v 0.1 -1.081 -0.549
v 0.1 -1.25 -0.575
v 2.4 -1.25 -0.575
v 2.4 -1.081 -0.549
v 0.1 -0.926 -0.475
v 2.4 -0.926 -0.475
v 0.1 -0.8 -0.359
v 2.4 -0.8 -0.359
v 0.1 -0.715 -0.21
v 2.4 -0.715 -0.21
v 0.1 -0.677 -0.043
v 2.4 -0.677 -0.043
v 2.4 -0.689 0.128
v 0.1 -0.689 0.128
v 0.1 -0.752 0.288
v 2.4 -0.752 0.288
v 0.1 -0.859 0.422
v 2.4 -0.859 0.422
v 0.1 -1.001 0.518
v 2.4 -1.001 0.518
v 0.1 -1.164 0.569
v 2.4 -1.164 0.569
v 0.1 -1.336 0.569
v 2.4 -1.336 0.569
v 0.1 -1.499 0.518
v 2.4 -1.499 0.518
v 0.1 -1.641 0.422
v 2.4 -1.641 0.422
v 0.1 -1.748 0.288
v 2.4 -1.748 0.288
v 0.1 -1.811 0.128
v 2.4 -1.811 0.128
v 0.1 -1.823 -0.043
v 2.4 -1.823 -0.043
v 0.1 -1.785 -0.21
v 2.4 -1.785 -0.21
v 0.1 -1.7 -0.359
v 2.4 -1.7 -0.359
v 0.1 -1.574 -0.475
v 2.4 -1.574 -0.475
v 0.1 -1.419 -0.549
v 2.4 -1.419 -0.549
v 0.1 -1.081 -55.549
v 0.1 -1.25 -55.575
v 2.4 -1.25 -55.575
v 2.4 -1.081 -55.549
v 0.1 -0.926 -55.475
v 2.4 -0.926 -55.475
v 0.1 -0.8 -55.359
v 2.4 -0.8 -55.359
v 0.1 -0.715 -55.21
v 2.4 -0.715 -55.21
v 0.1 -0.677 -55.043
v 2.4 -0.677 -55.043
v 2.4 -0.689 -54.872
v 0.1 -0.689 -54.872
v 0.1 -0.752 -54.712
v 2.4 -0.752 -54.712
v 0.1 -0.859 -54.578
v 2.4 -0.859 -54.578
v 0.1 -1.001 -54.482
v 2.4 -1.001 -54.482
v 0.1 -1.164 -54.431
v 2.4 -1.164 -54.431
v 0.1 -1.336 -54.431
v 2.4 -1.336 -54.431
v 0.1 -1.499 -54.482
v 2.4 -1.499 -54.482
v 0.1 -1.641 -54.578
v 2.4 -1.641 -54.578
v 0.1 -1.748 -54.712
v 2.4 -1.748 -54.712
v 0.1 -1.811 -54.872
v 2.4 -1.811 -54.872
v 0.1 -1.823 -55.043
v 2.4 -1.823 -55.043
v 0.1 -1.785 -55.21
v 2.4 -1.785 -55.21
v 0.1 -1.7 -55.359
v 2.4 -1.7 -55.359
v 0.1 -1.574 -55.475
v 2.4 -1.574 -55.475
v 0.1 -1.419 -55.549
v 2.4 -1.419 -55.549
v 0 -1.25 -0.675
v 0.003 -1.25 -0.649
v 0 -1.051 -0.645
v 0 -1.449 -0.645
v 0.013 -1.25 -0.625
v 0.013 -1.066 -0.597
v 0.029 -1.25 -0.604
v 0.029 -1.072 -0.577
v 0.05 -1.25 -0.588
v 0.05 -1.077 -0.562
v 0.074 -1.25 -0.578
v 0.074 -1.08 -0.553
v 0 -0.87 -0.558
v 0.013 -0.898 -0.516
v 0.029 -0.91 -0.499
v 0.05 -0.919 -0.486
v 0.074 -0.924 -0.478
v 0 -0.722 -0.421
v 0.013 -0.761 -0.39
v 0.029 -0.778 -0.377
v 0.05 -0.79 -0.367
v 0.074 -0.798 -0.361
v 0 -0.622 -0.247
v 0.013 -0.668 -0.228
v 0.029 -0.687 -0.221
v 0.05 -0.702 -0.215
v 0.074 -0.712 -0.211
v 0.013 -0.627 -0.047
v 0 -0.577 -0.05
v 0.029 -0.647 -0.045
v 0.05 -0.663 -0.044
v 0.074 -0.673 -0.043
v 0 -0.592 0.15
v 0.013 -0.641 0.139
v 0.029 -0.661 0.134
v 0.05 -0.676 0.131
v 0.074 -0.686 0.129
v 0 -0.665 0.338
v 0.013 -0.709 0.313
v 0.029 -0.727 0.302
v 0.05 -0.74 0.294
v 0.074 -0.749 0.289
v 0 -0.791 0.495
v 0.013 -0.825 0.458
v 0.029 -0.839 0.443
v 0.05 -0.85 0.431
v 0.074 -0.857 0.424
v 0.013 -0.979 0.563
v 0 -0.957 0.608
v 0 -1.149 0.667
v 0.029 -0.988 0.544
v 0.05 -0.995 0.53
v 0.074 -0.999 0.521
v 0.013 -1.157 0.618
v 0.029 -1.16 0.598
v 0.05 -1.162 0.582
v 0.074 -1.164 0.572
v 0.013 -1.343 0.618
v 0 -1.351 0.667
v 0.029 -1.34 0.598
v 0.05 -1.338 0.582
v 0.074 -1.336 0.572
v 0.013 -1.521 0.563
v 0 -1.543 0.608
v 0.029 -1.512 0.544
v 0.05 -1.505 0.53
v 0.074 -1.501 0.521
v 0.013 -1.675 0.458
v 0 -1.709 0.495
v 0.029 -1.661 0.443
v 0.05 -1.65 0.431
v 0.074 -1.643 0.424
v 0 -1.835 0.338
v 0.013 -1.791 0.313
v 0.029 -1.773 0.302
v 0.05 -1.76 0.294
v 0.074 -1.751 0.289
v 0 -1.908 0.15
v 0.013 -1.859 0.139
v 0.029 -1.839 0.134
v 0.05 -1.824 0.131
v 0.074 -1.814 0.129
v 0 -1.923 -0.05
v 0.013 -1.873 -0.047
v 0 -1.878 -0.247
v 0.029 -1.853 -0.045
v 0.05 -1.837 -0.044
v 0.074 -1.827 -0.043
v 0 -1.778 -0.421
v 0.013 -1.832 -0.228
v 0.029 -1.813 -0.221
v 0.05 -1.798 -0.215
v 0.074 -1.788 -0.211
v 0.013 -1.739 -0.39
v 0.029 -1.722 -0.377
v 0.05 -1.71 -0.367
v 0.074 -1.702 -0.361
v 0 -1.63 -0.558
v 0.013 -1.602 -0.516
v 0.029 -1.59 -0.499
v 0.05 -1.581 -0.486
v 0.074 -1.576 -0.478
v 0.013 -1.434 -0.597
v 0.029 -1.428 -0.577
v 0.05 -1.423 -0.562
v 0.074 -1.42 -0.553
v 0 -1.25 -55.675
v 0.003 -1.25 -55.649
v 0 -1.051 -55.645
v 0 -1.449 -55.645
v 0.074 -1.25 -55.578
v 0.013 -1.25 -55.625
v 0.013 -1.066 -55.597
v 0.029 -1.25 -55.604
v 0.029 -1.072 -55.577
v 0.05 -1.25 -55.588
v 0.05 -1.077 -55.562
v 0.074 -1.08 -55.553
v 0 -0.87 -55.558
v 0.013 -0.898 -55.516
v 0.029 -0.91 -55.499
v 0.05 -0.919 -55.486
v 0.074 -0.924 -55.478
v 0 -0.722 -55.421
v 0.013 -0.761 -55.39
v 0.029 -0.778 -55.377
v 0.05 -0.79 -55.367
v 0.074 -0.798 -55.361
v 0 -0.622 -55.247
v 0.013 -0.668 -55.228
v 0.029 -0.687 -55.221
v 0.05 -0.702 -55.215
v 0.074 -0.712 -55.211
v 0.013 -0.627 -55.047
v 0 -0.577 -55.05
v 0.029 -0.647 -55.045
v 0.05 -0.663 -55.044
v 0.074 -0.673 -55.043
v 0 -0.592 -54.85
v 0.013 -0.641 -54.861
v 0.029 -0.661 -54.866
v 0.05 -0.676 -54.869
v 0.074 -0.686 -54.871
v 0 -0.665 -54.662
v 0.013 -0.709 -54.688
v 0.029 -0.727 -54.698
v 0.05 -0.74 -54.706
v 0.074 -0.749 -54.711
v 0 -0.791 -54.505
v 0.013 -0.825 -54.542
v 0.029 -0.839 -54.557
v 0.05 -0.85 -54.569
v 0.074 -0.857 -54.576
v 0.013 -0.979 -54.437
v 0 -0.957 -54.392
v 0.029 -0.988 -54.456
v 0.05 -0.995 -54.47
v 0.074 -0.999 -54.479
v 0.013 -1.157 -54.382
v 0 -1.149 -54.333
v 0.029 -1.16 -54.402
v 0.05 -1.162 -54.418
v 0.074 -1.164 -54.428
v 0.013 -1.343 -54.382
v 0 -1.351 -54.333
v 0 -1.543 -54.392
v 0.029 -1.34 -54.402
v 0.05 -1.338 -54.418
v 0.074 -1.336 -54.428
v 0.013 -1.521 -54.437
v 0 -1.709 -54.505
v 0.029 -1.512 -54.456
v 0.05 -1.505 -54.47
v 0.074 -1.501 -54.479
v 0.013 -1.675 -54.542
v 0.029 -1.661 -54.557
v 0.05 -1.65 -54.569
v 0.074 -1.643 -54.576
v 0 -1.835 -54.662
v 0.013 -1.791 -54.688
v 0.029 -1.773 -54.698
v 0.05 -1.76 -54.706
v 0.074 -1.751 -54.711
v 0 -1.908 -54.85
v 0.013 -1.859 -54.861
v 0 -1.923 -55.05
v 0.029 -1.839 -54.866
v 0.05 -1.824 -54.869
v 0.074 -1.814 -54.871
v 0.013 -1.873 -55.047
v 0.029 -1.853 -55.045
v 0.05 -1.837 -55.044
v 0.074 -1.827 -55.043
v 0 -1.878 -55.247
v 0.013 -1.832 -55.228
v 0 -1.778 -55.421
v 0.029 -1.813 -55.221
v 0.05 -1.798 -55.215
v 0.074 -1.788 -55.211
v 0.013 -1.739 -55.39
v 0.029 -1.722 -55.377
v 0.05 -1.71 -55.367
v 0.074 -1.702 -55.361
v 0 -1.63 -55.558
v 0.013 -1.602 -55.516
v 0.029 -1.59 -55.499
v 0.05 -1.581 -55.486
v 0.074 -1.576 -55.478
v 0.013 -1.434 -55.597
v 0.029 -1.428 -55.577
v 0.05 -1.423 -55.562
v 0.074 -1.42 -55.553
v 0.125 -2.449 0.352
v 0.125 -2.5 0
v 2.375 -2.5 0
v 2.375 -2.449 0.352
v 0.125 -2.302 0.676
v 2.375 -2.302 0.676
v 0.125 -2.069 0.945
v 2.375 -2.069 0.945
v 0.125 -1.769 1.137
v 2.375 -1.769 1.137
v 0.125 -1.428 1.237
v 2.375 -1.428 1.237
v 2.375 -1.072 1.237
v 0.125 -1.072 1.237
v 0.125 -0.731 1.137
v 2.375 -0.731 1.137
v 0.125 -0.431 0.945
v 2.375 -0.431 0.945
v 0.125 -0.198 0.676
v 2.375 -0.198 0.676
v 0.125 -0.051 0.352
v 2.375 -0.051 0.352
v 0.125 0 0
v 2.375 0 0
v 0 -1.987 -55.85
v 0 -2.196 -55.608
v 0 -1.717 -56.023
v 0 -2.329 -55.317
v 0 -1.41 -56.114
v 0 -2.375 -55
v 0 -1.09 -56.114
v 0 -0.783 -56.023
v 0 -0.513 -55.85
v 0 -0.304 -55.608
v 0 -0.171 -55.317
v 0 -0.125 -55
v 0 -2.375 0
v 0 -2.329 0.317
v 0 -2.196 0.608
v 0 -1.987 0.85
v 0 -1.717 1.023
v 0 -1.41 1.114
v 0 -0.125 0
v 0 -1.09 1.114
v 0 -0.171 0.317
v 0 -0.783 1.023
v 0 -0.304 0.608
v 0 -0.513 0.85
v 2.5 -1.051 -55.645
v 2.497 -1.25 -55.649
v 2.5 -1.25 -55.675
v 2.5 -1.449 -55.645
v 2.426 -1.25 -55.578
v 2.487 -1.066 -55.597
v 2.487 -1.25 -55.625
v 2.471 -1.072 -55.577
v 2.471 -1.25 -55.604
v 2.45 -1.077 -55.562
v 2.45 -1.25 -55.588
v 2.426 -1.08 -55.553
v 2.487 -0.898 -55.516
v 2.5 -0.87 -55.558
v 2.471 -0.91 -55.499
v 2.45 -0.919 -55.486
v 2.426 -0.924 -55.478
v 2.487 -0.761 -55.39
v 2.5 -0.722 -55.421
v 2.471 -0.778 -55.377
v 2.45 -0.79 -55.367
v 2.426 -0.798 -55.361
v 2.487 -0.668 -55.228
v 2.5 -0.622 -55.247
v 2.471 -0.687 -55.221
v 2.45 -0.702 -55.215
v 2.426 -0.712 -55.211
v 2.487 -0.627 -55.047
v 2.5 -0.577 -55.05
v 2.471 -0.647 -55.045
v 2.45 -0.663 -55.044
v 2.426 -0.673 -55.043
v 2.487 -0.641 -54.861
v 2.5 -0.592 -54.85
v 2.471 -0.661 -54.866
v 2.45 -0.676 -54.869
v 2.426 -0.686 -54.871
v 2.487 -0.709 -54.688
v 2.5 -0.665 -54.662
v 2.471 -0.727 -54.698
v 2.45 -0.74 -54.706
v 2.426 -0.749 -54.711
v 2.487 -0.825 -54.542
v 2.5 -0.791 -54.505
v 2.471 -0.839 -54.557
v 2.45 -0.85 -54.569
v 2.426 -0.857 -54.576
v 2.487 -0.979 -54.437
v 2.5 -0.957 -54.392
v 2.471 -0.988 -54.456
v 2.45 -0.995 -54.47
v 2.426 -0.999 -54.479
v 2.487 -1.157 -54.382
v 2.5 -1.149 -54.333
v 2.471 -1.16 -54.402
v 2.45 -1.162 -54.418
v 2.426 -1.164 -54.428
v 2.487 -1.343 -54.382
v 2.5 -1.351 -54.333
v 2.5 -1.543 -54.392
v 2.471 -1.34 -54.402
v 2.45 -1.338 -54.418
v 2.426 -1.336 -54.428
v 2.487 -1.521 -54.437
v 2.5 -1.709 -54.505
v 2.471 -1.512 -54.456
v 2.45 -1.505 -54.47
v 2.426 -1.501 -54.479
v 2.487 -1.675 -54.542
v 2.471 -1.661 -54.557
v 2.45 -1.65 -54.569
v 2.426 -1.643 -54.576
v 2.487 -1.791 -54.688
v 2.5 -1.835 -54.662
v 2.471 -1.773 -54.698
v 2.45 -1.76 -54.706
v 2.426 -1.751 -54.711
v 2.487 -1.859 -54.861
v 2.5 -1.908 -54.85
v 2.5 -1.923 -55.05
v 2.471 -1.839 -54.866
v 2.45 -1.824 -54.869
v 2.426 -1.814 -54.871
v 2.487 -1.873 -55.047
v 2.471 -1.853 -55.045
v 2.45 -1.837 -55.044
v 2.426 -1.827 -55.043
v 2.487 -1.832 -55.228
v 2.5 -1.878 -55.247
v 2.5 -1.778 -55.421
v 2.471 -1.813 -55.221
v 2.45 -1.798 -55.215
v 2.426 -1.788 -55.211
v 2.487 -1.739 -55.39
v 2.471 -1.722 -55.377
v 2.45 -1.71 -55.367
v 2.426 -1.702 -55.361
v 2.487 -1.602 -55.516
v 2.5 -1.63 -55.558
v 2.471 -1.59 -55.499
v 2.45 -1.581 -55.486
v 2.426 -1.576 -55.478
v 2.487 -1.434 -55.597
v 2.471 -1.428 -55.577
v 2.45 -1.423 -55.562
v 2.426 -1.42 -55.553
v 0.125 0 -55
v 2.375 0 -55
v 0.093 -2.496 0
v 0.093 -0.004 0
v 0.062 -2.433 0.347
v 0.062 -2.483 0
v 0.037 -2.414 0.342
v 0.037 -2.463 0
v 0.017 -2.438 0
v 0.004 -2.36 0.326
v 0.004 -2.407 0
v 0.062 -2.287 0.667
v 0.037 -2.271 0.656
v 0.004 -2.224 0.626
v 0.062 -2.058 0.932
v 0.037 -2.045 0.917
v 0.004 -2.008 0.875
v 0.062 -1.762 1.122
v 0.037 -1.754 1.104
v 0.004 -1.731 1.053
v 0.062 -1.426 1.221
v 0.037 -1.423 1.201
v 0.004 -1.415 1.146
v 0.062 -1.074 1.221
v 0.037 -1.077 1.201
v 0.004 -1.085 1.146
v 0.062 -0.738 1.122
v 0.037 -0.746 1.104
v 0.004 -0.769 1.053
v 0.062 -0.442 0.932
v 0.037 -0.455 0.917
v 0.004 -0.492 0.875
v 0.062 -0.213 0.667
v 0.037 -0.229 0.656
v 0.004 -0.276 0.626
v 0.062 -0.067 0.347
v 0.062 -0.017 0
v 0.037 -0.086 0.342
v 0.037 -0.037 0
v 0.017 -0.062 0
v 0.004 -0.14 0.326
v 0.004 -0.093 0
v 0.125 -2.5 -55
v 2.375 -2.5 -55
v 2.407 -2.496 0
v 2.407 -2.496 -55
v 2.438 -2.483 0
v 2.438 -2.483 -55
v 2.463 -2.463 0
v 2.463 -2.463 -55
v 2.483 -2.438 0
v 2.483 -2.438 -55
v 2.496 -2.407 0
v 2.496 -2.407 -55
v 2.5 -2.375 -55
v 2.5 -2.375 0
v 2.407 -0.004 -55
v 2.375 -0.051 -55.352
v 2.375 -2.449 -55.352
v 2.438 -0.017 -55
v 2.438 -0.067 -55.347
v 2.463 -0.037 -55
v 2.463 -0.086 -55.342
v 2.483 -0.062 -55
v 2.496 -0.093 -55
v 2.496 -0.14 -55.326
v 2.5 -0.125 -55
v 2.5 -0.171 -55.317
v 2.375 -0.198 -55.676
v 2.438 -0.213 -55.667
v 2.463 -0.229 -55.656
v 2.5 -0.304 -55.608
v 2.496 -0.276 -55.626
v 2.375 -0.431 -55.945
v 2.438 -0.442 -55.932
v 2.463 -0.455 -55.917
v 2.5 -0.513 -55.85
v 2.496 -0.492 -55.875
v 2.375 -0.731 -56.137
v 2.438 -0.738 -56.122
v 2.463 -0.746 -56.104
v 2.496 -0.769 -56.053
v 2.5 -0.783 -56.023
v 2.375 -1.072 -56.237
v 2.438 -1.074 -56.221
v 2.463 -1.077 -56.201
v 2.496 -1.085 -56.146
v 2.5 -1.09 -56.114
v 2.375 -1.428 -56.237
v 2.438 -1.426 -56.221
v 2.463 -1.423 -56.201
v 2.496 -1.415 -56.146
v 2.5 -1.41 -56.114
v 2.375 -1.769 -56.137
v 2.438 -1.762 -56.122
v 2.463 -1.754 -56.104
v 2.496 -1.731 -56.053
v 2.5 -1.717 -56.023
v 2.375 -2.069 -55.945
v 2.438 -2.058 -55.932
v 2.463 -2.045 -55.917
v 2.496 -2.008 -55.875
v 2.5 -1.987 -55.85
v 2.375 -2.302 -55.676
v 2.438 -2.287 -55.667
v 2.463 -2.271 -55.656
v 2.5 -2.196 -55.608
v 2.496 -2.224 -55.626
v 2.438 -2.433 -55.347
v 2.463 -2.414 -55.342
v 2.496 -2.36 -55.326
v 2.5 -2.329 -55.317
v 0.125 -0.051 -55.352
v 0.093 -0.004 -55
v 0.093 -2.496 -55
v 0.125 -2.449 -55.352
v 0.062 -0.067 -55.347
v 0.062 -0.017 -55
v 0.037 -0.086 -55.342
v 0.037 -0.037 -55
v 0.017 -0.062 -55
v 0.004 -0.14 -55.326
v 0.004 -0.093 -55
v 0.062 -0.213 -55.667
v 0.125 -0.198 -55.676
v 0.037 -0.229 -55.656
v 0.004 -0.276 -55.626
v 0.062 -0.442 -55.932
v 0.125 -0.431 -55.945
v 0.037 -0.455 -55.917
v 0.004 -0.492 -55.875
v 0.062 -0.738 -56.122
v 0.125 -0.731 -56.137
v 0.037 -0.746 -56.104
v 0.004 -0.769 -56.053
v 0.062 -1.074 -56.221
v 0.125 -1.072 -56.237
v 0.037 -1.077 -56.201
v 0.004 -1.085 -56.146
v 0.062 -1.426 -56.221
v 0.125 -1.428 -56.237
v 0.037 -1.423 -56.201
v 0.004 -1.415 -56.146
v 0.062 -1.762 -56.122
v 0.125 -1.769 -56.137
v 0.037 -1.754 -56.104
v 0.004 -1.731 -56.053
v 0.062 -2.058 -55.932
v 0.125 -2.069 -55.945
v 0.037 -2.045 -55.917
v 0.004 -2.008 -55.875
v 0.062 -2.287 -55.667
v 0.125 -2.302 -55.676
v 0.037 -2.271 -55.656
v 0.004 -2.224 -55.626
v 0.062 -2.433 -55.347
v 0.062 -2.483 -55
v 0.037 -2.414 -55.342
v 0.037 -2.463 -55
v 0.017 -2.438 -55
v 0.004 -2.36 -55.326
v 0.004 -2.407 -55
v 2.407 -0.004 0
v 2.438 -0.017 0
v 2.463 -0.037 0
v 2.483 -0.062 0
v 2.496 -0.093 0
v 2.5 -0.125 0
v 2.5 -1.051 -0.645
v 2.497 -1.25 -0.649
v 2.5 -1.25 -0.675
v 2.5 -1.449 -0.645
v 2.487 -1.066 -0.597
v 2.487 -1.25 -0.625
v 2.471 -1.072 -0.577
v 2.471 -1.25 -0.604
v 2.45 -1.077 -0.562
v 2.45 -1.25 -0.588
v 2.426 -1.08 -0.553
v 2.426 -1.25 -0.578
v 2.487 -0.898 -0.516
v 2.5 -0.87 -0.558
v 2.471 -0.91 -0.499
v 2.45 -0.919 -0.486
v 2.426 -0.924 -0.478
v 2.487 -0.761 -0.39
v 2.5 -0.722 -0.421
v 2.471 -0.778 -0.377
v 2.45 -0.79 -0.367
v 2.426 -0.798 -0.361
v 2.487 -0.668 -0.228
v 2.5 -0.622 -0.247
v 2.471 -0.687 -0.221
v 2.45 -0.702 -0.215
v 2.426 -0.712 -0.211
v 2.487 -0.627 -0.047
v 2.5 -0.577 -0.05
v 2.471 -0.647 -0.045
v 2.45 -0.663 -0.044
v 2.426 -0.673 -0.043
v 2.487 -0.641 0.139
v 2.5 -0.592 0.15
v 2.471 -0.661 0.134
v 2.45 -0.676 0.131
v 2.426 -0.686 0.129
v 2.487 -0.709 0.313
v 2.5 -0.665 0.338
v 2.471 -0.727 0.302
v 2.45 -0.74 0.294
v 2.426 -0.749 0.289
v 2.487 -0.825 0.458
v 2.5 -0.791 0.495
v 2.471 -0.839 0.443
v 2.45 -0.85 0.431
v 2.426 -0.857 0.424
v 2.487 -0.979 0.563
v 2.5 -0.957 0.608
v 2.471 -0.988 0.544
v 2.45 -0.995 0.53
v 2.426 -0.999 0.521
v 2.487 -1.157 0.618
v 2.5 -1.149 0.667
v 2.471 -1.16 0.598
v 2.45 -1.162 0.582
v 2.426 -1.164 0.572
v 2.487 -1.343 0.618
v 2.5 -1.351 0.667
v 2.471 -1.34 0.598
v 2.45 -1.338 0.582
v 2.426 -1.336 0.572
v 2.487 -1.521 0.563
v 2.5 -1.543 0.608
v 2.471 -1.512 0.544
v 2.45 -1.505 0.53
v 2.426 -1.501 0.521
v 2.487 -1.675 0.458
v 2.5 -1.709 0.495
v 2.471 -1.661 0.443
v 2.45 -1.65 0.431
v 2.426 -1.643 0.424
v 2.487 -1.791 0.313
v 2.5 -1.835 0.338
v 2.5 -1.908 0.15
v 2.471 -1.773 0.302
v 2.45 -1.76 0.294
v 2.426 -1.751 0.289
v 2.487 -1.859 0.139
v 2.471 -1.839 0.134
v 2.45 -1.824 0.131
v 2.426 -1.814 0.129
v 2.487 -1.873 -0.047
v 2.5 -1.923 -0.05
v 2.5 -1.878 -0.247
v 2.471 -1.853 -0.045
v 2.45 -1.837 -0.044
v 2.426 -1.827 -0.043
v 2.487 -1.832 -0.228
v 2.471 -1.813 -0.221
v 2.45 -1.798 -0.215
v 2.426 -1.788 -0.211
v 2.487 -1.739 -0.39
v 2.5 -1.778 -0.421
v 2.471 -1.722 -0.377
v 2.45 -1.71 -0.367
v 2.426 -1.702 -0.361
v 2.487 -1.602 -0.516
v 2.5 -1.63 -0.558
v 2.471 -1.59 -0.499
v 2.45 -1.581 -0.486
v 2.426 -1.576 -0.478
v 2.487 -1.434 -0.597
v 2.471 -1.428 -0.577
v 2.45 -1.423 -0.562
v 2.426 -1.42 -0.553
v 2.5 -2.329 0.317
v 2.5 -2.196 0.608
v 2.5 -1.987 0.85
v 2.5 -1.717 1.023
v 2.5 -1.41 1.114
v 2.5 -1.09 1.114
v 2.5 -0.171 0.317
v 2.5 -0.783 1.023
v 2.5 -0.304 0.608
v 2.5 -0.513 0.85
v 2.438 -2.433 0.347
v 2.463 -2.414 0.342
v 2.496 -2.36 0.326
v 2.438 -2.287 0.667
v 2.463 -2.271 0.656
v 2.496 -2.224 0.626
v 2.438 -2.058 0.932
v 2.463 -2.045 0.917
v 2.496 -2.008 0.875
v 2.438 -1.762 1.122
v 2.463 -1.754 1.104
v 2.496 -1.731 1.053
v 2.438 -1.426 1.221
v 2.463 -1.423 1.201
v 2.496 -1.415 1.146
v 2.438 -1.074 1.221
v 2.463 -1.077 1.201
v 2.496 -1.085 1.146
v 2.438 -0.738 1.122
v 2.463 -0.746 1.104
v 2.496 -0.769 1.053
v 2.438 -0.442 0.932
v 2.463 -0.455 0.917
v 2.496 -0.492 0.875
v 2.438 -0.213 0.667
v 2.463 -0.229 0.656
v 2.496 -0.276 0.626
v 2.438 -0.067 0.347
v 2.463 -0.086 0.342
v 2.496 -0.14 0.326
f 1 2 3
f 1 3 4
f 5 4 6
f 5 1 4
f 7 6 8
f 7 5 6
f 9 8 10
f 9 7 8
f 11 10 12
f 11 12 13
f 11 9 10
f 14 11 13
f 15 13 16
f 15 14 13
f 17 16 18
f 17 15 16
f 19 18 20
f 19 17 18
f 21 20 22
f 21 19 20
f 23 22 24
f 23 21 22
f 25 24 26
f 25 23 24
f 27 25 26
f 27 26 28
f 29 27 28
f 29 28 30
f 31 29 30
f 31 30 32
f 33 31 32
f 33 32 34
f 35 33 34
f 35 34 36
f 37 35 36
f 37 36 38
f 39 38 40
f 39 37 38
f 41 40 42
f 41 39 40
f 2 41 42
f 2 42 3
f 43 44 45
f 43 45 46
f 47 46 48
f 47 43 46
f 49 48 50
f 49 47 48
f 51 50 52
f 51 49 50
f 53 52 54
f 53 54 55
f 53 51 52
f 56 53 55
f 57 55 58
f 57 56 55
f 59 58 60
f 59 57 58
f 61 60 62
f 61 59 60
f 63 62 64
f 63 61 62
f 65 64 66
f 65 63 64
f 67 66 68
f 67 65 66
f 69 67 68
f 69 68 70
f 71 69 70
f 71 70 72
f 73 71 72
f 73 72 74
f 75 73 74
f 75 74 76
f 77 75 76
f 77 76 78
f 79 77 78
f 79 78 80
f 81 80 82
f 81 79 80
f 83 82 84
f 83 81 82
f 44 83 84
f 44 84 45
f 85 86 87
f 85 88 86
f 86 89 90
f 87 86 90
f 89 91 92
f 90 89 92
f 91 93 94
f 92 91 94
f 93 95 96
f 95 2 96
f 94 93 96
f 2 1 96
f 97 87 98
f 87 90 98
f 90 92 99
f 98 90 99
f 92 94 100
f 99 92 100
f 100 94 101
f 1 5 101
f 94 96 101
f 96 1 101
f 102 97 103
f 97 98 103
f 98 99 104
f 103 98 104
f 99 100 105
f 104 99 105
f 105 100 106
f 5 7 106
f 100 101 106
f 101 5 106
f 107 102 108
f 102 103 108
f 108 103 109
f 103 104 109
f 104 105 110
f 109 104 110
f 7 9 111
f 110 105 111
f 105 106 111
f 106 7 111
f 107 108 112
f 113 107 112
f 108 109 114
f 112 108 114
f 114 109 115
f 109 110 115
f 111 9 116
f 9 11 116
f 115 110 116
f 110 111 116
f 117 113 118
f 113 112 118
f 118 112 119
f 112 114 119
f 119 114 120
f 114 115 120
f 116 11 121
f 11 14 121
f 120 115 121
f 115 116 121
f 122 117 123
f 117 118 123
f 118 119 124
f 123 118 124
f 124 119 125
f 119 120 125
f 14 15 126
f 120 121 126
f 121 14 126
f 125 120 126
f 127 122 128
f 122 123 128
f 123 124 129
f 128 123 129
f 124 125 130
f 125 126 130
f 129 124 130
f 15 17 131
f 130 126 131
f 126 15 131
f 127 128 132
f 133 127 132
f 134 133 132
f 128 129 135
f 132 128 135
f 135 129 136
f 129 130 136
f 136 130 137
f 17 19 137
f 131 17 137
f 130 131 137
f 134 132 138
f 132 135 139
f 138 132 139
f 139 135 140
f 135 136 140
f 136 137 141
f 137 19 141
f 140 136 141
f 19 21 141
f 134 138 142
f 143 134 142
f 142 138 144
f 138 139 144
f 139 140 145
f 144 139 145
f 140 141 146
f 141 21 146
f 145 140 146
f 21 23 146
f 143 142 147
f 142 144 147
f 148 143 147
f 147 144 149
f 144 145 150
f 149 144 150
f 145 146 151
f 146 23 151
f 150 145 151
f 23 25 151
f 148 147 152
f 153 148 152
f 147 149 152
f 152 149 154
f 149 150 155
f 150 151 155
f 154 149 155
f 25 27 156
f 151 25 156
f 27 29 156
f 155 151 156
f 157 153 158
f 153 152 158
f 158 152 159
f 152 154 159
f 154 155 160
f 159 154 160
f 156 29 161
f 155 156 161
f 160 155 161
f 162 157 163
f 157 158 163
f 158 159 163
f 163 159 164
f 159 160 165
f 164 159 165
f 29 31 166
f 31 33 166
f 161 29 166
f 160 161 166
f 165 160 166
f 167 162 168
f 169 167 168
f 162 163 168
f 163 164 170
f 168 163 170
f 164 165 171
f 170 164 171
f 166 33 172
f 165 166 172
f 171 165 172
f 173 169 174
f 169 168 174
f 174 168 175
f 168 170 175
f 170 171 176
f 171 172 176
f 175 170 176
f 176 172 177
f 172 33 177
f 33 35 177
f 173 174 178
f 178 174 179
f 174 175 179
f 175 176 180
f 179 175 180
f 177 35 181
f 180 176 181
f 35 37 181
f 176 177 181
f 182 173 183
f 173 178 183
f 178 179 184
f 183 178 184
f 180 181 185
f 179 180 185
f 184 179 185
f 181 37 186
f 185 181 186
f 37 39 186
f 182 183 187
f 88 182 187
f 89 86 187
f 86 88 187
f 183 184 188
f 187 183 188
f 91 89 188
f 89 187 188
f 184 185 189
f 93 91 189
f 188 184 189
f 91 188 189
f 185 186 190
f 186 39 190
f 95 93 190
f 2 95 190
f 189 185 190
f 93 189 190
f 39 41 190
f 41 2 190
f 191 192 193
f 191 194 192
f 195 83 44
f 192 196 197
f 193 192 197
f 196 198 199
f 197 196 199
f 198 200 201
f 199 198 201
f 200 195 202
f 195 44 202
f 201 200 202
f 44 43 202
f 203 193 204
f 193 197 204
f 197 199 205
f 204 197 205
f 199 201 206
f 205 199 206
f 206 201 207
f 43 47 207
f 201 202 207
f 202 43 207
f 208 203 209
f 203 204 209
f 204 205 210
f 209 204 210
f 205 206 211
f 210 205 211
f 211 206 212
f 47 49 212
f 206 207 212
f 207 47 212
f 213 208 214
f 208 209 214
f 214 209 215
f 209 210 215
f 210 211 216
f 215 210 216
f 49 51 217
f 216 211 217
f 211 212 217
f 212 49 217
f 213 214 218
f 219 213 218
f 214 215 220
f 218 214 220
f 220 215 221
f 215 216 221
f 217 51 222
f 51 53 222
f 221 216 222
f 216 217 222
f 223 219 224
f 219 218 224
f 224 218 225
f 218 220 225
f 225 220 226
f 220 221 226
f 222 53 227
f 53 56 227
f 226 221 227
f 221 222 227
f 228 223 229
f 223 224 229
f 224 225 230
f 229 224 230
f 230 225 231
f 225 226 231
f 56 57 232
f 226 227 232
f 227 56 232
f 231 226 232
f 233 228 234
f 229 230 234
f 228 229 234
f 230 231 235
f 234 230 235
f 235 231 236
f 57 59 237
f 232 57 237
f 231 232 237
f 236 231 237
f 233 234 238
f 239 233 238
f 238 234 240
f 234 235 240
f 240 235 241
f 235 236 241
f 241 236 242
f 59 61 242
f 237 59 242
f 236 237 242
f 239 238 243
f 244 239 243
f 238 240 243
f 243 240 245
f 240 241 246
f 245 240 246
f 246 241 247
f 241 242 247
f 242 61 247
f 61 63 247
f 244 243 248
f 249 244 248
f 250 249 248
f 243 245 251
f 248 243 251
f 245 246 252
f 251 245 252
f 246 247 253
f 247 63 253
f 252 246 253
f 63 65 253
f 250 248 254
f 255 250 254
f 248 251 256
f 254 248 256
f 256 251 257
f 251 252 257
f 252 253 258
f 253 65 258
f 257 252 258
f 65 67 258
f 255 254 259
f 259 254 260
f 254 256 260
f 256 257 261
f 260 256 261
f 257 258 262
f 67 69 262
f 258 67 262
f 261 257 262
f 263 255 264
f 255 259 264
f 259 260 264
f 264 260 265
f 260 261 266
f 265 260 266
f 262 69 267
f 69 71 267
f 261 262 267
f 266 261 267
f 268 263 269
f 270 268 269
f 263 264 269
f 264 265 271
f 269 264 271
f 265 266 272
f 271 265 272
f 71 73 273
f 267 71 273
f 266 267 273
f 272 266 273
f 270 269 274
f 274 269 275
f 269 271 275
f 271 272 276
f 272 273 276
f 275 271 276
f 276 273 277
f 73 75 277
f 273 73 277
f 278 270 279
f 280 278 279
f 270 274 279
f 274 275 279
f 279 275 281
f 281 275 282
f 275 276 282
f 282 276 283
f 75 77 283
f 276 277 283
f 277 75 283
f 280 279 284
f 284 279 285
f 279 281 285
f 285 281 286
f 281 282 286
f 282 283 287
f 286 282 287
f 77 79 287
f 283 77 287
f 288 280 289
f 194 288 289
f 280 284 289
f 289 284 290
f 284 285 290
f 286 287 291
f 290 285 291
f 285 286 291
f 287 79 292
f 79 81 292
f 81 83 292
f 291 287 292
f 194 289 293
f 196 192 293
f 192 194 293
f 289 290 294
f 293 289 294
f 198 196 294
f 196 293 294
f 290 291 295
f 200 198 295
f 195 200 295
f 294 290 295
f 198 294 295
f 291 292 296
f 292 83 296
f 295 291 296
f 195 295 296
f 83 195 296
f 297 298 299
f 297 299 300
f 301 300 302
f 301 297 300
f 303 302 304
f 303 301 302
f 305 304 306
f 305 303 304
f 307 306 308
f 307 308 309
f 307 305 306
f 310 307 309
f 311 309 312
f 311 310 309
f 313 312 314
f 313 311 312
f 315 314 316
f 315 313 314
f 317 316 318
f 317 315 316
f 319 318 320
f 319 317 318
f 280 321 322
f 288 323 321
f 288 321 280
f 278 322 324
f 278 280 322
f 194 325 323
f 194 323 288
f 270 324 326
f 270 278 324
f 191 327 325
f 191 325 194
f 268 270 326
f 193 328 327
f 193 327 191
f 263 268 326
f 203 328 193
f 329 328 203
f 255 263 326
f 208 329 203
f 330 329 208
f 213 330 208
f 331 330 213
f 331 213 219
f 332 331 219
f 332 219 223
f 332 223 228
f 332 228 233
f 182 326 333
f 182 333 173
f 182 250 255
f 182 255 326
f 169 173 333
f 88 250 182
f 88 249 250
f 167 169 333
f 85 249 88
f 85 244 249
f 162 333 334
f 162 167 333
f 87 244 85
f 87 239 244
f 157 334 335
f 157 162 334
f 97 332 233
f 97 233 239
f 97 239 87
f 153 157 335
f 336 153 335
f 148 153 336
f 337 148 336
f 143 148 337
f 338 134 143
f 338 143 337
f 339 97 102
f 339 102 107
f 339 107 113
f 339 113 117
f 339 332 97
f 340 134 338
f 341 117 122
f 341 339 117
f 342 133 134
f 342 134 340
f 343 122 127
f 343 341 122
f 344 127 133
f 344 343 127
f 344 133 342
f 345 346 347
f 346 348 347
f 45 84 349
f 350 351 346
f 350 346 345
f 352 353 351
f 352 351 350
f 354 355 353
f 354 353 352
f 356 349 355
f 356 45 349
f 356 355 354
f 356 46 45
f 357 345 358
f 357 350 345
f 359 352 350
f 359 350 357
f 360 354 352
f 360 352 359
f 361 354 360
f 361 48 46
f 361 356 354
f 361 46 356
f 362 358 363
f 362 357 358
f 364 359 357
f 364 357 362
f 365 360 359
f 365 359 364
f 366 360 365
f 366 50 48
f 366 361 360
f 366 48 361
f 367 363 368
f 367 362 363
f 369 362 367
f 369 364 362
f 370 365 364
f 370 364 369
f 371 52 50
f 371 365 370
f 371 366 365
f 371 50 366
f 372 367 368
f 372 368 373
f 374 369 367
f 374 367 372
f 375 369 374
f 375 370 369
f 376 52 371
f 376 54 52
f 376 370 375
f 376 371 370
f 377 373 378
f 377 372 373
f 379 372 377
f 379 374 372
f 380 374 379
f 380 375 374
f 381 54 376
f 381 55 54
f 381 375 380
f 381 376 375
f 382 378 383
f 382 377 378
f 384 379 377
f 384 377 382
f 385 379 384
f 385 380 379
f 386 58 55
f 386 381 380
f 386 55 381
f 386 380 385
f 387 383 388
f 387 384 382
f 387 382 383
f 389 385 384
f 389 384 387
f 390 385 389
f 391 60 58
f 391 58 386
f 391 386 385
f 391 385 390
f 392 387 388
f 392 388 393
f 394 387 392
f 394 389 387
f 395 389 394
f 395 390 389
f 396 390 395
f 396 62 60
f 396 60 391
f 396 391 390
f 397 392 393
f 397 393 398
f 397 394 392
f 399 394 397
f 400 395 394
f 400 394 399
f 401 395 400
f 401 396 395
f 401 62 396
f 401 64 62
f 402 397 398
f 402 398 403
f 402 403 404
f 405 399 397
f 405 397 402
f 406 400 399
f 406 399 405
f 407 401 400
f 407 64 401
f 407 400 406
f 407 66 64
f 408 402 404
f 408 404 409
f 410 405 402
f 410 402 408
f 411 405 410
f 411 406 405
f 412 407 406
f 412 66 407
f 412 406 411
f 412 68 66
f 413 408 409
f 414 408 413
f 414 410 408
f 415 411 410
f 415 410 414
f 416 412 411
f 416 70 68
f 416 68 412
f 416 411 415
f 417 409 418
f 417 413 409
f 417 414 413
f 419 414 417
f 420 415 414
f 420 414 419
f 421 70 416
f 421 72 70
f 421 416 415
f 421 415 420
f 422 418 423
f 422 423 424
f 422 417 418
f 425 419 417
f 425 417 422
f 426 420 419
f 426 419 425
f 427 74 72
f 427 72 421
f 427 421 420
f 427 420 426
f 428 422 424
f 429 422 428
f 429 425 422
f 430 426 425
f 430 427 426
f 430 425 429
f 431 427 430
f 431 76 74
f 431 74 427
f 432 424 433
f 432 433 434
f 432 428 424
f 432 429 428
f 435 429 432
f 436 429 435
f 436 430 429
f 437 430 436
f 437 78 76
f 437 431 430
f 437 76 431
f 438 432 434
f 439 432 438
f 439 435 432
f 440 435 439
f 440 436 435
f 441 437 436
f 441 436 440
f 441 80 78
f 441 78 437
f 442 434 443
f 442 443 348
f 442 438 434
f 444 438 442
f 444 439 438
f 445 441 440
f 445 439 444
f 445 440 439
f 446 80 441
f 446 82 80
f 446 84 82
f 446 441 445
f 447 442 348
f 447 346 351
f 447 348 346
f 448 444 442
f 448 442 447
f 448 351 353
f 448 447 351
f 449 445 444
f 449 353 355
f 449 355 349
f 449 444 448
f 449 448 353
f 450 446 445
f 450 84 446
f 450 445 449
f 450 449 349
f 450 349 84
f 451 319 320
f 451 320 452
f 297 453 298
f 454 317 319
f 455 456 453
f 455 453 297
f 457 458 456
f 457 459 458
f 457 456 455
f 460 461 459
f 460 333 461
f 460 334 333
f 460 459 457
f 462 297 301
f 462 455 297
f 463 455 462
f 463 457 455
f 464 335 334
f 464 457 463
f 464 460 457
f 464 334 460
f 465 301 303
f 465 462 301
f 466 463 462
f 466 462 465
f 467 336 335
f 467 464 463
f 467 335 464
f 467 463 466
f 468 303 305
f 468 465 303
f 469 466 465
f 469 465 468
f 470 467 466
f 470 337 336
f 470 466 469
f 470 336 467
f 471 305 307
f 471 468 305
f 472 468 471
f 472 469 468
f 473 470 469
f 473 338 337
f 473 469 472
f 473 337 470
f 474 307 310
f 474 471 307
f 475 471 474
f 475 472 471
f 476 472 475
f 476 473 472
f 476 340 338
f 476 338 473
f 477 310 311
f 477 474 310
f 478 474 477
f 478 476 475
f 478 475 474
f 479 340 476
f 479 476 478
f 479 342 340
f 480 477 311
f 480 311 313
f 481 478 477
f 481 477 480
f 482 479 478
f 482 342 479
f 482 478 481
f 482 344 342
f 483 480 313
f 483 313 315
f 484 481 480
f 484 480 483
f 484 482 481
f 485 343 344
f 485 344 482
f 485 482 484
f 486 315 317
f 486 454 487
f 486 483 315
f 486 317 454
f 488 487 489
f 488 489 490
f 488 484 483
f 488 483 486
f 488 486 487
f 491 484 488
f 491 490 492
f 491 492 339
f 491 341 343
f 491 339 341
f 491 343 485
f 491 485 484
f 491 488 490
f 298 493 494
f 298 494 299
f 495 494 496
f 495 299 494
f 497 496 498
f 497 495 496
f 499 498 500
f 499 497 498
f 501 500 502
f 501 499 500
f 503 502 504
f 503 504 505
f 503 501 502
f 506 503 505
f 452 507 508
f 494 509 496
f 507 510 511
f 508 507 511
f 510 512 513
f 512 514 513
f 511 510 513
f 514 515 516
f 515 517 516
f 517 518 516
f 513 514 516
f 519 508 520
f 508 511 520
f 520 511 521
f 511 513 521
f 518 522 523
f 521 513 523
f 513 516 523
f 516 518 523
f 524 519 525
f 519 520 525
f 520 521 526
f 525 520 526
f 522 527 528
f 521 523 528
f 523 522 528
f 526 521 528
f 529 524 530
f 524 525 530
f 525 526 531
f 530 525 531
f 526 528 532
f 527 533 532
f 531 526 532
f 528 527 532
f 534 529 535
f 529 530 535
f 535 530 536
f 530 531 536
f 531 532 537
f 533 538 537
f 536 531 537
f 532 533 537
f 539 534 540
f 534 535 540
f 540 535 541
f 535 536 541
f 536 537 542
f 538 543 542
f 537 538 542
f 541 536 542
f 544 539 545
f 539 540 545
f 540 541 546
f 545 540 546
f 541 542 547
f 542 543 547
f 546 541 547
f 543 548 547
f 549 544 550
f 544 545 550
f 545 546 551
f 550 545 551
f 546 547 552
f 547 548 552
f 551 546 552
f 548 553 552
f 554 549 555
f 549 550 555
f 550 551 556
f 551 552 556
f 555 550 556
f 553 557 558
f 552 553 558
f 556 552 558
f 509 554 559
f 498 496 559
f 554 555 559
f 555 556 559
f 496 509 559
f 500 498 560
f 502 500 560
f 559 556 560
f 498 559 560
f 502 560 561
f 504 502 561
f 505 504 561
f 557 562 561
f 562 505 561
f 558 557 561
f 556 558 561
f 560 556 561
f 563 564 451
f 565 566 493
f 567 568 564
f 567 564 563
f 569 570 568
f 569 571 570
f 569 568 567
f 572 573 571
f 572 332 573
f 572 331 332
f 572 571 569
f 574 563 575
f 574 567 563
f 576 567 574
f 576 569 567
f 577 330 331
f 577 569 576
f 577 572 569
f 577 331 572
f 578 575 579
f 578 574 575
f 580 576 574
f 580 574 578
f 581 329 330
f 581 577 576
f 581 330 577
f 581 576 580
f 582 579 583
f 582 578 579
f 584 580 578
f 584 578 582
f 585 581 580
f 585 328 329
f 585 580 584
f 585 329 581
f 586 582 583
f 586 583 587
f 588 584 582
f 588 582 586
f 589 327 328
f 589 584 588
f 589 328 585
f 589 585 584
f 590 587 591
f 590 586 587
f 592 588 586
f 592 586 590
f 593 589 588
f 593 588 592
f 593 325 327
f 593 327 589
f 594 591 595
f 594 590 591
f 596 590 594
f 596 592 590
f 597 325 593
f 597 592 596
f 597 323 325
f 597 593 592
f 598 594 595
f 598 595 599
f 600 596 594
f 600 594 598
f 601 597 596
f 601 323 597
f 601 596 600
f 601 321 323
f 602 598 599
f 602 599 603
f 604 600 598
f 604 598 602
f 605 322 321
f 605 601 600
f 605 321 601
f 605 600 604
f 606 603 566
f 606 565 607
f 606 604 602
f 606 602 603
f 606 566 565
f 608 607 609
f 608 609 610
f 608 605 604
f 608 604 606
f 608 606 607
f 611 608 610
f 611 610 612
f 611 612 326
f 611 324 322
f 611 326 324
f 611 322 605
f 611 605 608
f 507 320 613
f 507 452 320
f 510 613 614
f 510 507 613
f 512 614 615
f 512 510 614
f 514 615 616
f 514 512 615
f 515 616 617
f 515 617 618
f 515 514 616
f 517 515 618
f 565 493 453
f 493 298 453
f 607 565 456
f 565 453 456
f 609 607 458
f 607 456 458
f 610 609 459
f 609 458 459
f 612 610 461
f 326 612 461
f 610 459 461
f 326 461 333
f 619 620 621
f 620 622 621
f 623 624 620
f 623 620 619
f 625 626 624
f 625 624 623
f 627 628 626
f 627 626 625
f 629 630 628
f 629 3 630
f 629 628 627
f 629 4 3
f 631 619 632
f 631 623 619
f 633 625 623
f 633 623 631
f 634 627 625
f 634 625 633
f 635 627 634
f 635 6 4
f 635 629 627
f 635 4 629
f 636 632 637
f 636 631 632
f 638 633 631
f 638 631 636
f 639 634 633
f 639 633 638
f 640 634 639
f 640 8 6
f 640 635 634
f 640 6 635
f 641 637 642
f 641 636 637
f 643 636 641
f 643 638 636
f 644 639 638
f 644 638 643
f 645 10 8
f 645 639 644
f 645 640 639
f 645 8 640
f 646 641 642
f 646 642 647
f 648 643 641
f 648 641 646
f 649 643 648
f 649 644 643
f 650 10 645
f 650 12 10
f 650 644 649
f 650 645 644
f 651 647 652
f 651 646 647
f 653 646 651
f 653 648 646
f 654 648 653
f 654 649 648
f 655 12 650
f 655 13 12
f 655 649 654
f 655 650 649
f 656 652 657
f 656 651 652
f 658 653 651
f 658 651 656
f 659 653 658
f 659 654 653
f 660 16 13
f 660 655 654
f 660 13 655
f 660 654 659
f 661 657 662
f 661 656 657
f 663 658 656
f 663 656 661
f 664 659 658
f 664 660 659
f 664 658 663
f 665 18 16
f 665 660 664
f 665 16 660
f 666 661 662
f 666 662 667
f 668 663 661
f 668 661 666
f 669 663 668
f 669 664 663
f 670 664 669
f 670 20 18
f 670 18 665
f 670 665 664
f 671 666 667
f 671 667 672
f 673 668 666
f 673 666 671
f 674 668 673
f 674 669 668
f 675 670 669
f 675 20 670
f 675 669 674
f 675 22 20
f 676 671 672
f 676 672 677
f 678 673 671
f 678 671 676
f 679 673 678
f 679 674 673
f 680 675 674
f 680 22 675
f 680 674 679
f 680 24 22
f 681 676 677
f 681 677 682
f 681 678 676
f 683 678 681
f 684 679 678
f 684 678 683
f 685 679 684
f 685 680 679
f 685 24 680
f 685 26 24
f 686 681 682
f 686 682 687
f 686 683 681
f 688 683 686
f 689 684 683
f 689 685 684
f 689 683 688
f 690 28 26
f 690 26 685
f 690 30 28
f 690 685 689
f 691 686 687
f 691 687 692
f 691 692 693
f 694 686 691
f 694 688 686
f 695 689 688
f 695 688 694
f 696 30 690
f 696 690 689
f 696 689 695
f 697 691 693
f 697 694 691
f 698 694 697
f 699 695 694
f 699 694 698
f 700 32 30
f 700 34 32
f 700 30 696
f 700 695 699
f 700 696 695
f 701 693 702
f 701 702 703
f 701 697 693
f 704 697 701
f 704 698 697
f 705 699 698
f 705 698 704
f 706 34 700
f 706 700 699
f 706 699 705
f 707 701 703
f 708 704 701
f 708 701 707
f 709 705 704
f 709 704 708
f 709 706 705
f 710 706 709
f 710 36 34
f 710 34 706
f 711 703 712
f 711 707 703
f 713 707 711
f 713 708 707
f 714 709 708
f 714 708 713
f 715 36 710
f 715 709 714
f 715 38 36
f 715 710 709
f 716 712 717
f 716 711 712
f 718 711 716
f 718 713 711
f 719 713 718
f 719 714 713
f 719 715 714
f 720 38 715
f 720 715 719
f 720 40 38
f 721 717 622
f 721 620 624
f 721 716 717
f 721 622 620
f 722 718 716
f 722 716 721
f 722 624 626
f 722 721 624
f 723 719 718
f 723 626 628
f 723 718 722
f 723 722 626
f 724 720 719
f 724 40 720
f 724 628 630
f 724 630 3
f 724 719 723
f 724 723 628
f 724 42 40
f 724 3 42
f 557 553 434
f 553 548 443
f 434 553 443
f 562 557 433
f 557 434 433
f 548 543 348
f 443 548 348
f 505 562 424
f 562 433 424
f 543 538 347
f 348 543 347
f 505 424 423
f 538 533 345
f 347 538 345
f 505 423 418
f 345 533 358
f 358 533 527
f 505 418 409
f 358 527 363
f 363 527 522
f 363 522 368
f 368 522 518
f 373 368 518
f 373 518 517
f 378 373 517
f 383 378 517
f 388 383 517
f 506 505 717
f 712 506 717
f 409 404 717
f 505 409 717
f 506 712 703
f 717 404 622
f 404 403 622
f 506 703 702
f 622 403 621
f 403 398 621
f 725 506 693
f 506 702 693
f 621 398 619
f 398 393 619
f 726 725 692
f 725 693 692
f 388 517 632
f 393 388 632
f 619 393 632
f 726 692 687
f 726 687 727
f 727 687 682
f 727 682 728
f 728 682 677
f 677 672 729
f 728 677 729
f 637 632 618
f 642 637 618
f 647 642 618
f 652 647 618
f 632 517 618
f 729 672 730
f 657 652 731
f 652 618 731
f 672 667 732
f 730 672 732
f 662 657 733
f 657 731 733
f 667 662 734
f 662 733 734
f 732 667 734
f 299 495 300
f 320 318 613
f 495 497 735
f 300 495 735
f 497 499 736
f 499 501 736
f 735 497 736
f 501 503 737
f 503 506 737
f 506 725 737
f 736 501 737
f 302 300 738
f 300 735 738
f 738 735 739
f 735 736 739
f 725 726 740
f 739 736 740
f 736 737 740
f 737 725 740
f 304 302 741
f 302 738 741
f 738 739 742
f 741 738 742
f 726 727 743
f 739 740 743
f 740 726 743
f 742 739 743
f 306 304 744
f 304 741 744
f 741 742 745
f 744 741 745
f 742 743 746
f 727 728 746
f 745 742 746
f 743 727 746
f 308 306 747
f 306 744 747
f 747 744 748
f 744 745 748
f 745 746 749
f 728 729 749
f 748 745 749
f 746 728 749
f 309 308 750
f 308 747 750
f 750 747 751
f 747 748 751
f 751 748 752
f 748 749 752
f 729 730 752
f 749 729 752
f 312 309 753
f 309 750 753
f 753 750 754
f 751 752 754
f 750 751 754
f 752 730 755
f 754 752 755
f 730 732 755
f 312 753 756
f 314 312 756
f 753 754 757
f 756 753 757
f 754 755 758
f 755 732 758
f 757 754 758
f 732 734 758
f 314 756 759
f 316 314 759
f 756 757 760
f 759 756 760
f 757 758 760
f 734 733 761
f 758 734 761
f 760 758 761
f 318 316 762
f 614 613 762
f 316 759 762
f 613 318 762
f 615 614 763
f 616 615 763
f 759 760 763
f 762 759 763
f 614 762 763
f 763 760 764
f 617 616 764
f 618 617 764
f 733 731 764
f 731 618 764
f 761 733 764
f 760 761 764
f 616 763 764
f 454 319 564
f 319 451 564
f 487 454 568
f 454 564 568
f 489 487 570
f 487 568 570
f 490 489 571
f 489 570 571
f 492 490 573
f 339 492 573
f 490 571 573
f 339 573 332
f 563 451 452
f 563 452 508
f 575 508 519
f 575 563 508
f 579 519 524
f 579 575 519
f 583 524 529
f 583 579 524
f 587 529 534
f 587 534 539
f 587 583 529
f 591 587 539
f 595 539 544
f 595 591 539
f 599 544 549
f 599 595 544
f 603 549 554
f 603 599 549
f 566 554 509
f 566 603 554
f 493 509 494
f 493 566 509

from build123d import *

# Parameters (mm, degrees)
SKETCH1_R           = 0.575
BOSS_EXTRUDE1_DEPTH = 2.5
FILLET1_R           = 0.125
FILLET2_R           = 0.1


with BuildPart() as part:
    # Sketch1 → Boss-Extrude1 (new body)
    with BuildSketch(Plane(origin=(0, 0, 0), x_dir=(0, 0, -1), z_dir=(1, 0, 0))):
        with BuildLine():
            Line((0, 0), (55, 0))
            ThreePointArc((55, 0), (56.25, -1.25), (55, -2.5))
            Line((55, -2.5), (0, -2.5))
            ThreePointArc((0, -2.5), (-1.25, -1.25), (0, 0))
        make_face()
        with Locations((0, -1.25)):
            Circle(SKETCH1_R, mode=Mode.SUBTRACT)
        with Locations((55, -1.25)):
            Circle(SKETCH1_R, mode=Mode.SUBTRACT)
    extrude(amount=BOSS_EXTRUDE1_DEPTH)

    # Fillet1
    fillet1_edges = [part.edges().sort_by_distance(p)[0] for p in [
        (2.5, -1.25, -56.25),
        (2.5, 0, -27.5),
        (2.5, -1.25, 1.25),
        (0, 0, -27.5),
        (0, -1.25, -56.25),
        (0, -2.5, -27.5),
        (0, -1.25, 1.25),
        (2.5, -2.5, -27.5),
    ]]
    fillet(fillet1_edges, radius=FILLET1_R)

    # Fillet2
    fillet2_edges = [part.edges().sort_by_distance(p)[0] for p in [
        (0, -1.25, 0.575),
        (2.5, -1.25, 0.575),
        (0, -1.25, -54.425),
        (2.5, -1.25, -54.425),
    ]]
    fillet(fillet2_edges, radius=FILLET2_R)


solid = part.part
